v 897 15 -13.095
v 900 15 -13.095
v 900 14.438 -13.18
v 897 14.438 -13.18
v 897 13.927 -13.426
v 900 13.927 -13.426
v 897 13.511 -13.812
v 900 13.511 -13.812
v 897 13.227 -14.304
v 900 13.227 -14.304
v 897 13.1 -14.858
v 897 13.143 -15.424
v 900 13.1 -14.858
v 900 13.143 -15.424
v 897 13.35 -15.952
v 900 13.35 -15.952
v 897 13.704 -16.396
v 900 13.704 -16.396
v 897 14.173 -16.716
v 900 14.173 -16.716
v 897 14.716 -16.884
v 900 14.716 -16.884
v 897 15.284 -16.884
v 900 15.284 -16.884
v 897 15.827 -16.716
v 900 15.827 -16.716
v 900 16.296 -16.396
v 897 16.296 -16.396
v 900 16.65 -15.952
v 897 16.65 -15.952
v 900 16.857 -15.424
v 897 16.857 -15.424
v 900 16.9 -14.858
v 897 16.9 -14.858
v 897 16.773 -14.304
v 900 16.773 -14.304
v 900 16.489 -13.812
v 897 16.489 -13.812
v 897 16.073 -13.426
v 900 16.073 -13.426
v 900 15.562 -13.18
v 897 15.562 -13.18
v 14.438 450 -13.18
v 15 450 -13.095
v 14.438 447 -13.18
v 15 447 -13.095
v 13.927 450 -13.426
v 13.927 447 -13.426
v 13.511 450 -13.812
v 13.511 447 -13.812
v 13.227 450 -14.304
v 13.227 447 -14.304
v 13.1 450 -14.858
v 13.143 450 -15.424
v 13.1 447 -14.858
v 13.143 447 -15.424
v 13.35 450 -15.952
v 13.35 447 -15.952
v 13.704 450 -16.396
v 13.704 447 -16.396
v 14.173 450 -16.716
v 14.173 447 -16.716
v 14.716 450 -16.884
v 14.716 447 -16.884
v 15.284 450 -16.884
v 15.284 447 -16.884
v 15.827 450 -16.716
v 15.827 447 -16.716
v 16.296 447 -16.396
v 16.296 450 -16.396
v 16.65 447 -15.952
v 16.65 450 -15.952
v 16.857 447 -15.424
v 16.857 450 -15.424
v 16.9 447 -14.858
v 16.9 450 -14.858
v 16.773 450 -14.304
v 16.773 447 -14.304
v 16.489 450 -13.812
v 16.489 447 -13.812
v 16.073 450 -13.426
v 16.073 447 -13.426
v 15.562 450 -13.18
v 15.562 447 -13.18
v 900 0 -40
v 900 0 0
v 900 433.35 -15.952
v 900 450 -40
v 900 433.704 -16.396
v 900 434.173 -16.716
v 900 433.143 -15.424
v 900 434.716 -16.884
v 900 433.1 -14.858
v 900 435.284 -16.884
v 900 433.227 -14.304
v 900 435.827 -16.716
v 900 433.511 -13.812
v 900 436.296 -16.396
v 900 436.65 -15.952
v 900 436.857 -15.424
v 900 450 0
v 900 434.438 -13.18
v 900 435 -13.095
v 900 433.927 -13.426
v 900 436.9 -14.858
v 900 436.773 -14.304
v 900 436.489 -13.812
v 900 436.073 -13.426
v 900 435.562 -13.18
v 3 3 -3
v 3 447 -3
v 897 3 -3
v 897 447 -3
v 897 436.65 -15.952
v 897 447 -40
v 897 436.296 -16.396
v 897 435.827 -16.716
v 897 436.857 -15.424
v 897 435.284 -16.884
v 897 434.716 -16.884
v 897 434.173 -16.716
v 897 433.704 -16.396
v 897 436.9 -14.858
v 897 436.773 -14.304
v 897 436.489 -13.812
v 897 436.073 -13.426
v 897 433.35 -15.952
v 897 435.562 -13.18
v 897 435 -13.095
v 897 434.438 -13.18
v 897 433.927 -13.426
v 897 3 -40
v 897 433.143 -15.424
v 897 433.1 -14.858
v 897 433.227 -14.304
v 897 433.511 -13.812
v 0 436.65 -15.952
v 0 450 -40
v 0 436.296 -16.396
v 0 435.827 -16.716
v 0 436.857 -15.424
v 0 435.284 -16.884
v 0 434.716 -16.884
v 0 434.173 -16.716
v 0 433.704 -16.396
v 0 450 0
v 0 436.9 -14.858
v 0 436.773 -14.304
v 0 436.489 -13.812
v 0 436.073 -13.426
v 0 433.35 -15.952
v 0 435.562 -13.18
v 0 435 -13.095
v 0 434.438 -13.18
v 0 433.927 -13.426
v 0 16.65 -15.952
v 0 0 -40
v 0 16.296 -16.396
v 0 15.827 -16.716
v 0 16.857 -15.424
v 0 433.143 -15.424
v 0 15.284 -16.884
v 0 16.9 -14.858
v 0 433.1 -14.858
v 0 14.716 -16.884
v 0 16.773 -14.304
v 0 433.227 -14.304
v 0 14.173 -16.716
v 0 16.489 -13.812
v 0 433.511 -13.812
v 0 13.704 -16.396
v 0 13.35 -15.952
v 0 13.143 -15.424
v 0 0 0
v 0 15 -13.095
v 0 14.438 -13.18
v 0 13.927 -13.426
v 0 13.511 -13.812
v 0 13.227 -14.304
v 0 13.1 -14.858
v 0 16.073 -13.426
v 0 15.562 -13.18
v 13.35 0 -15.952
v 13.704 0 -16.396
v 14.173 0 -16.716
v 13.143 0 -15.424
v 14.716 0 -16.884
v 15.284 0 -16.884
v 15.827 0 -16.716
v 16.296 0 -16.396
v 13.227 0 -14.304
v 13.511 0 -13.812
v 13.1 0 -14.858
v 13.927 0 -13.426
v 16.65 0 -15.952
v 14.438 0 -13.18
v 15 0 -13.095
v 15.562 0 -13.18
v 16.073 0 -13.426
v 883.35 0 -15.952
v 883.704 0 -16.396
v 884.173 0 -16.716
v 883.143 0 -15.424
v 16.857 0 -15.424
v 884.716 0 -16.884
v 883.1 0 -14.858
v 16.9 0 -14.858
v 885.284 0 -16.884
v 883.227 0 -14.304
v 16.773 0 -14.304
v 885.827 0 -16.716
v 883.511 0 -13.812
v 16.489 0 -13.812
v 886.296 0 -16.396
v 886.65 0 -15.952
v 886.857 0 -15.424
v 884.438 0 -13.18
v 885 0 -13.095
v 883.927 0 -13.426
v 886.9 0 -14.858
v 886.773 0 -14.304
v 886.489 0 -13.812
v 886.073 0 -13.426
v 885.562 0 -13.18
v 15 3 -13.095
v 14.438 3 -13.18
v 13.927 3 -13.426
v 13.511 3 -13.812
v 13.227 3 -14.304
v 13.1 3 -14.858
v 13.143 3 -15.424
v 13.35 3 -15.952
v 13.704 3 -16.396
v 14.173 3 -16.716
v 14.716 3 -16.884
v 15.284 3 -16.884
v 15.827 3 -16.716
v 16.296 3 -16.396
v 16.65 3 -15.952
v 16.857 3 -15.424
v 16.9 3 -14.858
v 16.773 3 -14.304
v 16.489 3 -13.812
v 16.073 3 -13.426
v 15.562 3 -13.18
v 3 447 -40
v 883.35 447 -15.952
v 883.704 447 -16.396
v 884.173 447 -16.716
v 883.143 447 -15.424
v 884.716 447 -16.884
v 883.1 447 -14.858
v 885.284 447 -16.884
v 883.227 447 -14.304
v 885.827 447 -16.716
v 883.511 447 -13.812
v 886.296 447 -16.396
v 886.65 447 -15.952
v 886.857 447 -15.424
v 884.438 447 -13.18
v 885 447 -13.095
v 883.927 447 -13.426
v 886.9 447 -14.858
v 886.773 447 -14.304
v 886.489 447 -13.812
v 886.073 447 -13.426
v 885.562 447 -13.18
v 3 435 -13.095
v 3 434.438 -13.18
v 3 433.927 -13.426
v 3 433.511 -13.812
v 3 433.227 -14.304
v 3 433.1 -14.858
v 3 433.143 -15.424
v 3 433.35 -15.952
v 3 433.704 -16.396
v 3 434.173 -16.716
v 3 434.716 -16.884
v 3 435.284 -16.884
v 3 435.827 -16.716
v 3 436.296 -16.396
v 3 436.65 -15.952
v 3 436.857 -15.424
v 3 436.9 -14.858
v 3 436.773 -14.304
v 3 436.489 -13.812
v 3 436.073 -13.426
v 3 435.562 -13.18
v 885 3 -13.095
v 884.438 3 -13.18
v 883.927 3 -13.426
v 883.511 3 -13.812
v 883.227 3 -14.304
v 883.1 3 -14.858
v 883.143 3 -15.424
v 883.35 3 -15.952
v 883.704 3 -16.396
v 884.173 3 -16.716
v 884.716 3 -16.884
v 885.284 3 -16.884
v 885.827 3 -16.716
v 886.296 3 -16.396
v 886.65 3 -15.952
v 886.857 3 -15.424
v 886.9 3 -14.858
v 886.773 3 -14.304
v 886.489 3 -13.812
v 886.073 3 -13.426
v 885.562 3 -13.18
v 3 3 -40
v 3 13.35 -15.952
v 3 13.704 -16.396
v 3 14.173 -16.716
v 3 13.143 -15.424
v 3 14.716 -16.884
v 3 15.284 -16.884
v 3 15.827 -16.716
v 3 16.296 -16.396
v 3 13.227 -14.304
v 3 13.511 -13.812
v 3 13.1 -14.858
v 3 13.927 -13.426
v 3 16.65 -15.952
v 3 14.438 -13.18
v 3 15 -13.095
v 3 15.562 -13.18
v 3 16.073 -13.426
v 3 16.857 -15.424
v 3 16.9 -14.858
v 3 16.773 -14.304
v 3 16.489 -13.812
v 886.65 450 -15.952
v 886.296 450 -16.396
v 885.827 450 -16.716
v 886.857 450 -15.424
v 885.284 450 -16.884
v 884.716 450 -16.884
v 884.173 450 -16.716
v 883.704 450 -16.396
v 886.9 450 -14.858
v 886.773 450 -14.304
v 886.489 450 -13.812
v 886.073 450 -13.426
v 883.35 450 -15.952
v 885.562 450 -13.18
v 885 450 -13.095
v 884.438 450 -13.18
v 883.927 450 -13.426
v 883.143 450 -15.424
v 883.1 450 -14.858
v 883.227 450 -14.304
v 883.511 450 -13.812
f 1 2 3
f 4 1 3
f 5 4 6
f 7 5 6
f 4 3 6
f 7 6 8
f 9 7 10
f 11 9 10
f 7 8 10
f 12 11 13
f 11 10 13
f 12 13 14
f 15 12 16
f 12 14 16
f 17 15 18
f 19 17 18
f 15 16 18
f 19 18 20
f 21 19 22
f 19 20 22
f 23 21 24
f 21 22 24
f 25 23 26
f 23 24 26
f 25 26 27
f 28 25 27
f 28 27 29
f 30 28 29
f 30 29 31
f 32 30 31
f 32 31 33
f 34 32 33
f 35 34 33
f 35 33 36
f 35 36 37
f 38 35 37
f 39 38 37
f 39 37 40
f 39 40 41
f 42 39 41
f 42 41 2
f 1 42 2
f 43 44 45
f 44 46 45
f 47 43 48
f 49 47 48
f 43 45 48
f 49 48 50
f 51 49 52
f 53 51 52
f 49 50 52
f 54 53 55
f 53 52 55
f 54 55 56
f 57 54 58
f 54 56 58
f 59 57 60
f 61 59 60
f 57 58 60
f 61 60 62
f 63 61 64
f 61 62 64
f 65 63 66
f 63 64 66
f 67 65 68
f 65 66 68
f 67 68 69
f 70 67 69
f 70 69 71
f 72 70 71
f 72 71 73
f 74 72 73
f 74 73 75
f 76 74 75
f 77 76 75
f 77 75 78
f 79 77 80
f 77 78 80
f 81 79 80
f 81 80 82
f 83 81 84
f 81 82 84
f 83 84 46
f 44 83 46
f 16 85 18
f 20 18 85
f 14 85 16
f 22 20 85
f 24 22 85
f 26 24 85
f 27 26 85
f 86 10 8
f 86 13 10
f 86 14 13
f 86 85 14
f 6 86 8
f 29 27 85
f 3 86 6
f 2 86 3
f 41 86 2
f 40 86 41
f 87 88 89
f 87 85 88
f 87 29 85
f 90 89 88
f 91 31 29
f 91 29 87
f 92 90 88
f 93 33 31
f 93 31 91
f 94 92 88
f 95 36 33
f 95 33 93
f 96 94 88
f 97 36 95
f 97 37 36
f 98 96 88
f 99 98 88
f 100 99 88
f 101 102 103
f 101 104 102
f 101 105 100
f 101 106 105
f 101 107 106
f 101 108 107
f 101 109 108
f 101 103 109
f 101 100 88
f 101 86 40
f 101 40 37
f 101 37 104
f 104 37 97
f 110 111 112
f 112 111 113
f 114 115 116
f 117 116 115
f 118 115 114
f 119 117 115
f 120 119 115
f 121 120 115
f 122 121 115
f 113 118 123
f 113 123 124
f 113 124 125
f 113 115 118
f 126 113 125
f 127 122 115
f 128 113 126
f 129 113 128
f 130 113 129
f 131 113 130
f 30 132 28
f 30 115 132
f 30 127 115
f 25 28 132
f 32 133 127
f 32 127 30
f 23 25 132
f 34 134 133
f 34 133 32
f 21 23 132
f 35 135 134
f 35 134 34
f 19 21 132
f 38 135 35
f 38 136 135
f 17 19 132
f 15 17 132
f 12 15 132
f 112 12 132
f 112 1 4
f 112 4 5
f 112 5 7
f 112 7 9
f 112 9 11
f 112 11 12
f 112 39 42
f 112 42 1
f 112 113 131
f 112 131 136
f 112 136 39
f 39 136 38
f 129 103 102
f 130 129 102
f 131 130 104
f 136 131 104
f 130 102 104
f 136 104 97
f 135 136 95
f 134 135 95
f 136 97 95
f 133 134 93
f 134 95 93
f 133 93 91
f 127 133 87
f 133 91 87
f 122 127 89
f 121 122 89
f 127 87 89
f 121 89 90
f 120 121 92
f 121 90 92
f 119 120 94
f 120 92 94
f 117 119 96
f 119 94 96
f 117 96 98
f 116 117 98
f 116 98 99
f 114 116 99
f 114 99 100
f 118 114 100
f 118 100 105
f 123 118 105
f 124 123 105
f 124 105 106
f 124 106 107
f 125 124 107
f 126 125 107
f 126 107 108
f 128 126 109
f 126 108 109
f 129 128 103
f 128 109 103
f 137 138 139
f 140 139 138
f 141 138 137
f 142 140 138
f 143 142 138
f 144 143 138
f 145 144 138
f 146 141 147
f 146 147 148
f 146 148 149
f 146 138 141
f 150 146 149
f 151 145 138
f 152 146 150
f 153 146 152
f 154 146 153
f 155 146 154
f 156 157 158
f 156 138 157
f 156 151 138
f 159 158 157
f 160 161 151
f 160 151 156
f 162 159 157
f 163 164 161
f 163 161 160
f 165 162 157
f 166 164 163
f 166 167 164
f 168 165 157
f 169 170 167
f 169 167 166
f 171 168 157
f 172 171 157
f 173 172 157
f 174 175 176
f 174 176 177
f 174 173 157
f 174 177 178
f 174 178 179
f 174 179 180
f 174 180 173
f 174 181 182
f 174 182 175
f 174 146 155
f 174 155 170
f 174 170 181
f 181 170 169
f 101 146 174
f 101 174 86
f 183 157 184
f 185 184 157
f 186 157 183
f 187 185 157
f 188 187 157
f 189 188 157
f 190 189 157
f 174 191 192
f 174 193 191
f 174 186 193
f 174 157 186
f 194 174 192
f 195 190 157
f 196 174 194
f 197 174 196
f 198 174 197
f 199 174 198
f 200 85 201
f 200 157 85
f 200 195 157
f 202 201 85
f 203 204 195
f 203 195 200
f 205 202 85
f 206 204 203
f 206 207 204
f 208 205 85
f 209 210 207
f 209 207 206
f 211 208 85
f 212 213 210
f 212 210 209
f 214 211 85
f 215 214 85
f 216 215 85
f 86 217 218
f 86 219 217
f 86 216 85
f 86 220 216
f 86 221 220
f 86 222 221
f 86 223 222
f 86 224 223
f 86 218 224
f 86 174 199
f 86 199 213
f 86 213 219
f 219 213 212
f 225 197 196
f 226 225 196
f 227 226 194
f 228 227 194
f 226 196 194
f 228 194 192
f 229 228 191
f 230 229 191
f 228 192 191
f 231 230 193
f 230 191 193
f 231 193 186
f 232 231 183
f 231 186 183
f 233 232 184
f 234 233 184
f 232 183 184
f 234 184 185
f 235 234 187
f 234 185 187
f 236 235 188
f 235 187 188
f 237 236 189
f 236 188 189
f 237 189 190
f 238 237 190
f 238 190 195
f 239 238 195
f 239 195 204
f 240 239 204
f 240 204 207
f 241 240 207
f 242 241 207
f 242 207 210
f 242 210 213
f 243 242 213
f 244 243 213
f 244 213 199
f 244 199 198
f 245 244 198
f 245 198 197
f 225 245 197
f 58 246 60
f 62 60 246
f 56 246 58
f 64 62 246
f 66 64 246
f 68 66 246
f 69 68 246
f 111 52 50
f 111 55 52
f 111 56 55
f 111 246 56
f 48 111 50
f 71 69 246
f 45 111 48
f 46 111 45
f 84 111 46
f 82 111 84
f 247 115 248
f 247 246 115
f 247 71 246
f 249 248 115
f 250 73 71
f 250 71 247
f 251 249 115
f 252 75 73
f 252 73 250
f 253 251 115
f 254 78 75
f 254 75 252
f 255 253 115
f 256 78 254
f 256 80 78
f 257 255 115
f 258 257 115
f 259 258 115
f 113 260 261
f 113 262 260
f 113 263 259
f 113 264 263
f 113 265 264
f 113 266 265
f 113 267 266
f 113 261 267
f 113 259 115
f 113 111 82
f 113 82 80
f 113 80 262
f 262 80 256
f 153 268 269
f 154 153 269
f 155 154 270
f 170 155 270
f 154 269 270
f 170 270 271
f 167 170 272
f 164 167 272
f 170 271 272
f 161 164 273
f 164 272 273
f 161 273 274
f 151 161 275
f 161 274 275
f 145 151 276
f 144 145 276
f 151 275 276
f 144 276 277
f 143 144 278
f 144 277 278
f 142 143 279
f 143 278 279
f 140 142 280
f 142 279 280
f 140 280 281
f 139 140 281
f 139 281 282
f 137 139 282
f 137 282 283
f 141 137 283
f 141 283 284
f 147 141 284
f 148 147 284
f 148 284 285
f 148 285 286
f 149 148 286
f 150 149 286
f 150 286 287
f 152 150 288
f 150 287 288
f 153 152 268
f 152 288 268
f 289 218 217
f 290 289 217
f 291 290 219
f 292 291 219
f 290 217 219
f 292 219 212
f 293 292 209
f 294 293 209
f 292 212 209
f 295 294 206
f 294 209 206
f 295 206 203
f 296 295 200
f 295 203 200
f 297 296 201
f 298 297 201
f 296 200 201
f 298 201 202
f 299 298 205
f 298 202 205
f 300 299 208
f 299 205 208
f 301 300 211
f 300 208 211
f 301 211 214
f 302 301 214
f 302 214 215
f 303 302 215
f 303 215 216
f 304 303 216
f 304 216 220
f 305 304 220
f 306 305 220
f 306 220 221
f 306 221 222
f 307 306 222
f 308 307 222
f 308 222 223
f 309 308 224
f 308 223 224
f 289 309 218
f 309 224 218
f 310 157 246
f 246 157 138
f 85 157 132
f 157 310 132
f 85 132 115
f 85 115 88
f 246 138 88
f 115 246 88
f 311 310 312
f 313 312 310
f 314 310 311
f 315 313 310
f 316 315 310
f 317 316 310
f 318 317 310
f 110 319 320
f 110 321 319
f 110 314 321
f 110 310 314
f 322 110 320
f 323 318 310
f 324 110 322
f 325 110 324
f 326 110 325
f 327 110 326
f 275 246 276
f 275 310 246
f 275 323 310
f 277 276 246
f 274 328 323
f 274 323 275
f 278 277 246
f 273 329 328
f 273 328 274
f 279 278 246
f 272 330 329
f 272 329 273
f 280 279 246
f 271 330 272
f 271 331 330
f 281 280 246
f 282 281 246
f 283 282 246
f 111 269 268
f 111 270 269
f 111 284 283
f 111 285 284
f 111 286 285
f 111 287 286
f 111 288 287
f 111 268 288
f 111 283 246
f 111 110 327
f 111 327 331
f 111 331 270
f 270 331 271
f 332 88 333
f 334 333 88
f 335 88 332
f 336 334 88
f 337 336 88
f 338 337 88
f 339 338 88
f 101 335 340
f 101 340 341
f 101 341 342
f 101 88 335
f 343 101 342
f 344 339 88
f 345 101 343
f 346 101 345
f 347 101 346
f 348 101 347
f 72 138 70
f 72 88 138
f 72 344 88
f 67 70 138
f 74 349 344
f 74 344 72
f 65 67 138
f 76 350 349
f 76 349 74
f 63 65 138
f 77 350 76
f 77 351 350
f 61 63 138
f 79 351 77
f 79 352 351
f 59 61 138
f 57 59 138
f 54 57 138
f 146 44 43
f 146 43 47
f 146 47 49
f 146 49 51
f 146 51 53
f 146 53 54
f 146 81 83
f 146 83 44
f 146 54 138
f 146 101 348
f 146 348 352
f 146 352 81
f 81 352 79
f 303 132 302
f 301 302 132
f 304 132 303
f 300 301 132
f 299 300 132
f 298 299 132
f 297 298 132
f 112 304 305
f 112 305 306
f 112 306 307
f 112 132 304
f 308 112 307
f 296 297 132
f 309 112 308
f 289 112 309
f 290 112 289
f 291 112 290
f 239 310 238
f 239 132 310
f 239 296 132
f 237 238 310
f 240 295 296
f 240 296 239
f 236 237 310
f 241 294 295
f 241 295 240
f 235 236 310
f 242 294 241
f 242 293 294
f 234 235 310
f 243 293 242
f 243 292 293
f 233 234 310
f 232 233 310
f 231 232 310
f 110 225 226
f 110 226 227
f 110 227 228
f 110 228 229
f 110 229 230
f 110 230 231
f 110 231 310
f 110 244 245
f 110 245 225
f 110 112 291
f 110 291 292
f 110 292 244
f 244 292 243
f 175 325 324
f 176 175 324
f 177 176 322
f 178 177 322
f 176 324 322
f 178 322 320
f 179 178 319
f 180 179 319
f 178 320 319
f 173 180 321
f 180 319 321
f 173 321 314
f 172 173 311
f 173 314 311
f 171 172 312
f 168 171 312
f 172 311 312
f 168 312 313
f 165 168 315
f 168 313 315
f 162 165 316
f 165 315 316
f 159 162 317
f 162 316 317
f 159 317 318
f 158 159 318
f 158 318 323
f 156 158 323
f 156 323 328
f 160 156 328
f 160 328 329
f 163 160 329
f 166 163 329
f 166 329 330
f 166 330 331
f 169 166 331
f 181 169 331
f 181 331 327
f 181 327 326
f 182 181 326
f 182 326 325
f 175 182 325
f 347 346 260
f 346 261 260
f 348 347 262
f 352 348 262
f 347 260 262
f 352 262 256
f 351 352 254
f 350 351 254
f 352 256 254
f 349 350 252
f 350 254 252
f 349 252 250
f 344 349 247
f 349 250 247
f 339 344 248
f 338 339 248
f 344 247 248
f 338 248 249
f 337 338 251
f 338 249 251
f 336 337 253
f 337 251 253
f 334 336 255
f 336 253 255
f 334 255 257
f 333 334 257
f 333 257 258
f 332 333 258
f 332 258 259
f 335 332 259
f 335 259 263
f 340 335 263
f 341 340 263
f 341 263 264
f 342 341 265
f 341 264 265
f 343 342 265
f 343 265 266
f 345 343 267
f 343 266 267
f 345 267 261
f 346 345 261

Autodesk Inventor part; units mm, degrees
ref_plane "YZ Plane" through (0, 0, 0) normal (1, 0, 0) x (0, 1, 0)
ref_plane "XZ Plane" through (0, 0, 0) normal (0, 1, 0) x (-1, 0, 0)
ref_plane "XY Plane" through (0, 0, 0) normal (0, 0, 1) x (1, 0, 0)
sketch "Sketch1" plane through (0, 0, 0) normal (0, 0, 1) x (1, 0, 0)
  line L0 (0, 0) -> (900, 0)
  line L1 (900, 0) -> (900, 450)
  line L2 (900, 450) -> (0, 450)
  line L3 (0, 450) -> (0, 0)
  line L4 (3, 447) -> (897, 447)
  line L5 (897, 447) -> (897, 3)
  line L6 (897, 3) -> (3, 3)
  line L7 (3, 3) -> (3, 447)
  dimension "d8" = 900
  dimension "d9" = 450
  dimension "d10" = 3
extrude "Extrusion2" add sketch "Sketch1" against normal blind 40
extrude "Extrusion3" add sketch "Sketch1" against normal blind 3 contours L3 L2 L1 L0 | L4 L5 L6 L7
sketch "Sketch2" plane through (0, 450, -40) normal (0, 1, 0) x (1, 0, 0)
  line L0 (0, -40) -> (0, 0) projected
  line L1 (900, -40) -> (0, -40) projected
  line L2 (900, -40) -> (900, 0) projected
  point P0 (15, -25)
  point P1 (885, -25)
  dimension "d22" = 15
  dimension "d23" = 15
  dimension "d24" = 15
  dimension "d25" = 15
hole "Hole1" at (15, 450, -15) at (885, 450, -15) direction (0, -1, 0) diameter 3.81 end through all
sketch "Sketch3" plane through (0, 0, -40) normal (-1, 0, 0) x (0, 0, 1)
  line L0 (40, 450) -> (40, 0) projected
  line L1 (40, 0) -> (0, 0) projected
  line L2 (40, 450) -> (0, 450) projected
  point P0 (25, 15)
  point P1 (25, 435)
  dimension "d26" = 15
  dimension "d27" = 15
  dimension "d28" = 15
  dimension "d29" = 15
hole "Hole2" at (0, 15, -15) at (0, 435, -15) direction (1, 0, 0) diameter 3.81 end through all
equation "\"d8\" = Width"
equation "\"d9\" = Depth"
equation "\"d10\" = Thickness"
equation "\"d11\" = Height"
equation "\"d13\" = Thickness"
equation "\"d22\" = HoleDistance"
equation "\"d23\" = HoleDistance"
equation "\"d24\" = HoleDistance"
equation "\"d25\" = HoleDistance"
equation "\"d26\" = HoleDistance"
equation "\"d27\" = HoleDistance"
equation "\"d28\" = HoleDistance"
equation "\"d29\" = HoleDistance"
equation "\"Width\" = 900"
equation "\"Thickness\" = 3"
equation "\"Depth\" = 450"
equation "\"Height\" = 40"
equation "\"HoleDistance\" = 15"
properties part number "shelf90"
